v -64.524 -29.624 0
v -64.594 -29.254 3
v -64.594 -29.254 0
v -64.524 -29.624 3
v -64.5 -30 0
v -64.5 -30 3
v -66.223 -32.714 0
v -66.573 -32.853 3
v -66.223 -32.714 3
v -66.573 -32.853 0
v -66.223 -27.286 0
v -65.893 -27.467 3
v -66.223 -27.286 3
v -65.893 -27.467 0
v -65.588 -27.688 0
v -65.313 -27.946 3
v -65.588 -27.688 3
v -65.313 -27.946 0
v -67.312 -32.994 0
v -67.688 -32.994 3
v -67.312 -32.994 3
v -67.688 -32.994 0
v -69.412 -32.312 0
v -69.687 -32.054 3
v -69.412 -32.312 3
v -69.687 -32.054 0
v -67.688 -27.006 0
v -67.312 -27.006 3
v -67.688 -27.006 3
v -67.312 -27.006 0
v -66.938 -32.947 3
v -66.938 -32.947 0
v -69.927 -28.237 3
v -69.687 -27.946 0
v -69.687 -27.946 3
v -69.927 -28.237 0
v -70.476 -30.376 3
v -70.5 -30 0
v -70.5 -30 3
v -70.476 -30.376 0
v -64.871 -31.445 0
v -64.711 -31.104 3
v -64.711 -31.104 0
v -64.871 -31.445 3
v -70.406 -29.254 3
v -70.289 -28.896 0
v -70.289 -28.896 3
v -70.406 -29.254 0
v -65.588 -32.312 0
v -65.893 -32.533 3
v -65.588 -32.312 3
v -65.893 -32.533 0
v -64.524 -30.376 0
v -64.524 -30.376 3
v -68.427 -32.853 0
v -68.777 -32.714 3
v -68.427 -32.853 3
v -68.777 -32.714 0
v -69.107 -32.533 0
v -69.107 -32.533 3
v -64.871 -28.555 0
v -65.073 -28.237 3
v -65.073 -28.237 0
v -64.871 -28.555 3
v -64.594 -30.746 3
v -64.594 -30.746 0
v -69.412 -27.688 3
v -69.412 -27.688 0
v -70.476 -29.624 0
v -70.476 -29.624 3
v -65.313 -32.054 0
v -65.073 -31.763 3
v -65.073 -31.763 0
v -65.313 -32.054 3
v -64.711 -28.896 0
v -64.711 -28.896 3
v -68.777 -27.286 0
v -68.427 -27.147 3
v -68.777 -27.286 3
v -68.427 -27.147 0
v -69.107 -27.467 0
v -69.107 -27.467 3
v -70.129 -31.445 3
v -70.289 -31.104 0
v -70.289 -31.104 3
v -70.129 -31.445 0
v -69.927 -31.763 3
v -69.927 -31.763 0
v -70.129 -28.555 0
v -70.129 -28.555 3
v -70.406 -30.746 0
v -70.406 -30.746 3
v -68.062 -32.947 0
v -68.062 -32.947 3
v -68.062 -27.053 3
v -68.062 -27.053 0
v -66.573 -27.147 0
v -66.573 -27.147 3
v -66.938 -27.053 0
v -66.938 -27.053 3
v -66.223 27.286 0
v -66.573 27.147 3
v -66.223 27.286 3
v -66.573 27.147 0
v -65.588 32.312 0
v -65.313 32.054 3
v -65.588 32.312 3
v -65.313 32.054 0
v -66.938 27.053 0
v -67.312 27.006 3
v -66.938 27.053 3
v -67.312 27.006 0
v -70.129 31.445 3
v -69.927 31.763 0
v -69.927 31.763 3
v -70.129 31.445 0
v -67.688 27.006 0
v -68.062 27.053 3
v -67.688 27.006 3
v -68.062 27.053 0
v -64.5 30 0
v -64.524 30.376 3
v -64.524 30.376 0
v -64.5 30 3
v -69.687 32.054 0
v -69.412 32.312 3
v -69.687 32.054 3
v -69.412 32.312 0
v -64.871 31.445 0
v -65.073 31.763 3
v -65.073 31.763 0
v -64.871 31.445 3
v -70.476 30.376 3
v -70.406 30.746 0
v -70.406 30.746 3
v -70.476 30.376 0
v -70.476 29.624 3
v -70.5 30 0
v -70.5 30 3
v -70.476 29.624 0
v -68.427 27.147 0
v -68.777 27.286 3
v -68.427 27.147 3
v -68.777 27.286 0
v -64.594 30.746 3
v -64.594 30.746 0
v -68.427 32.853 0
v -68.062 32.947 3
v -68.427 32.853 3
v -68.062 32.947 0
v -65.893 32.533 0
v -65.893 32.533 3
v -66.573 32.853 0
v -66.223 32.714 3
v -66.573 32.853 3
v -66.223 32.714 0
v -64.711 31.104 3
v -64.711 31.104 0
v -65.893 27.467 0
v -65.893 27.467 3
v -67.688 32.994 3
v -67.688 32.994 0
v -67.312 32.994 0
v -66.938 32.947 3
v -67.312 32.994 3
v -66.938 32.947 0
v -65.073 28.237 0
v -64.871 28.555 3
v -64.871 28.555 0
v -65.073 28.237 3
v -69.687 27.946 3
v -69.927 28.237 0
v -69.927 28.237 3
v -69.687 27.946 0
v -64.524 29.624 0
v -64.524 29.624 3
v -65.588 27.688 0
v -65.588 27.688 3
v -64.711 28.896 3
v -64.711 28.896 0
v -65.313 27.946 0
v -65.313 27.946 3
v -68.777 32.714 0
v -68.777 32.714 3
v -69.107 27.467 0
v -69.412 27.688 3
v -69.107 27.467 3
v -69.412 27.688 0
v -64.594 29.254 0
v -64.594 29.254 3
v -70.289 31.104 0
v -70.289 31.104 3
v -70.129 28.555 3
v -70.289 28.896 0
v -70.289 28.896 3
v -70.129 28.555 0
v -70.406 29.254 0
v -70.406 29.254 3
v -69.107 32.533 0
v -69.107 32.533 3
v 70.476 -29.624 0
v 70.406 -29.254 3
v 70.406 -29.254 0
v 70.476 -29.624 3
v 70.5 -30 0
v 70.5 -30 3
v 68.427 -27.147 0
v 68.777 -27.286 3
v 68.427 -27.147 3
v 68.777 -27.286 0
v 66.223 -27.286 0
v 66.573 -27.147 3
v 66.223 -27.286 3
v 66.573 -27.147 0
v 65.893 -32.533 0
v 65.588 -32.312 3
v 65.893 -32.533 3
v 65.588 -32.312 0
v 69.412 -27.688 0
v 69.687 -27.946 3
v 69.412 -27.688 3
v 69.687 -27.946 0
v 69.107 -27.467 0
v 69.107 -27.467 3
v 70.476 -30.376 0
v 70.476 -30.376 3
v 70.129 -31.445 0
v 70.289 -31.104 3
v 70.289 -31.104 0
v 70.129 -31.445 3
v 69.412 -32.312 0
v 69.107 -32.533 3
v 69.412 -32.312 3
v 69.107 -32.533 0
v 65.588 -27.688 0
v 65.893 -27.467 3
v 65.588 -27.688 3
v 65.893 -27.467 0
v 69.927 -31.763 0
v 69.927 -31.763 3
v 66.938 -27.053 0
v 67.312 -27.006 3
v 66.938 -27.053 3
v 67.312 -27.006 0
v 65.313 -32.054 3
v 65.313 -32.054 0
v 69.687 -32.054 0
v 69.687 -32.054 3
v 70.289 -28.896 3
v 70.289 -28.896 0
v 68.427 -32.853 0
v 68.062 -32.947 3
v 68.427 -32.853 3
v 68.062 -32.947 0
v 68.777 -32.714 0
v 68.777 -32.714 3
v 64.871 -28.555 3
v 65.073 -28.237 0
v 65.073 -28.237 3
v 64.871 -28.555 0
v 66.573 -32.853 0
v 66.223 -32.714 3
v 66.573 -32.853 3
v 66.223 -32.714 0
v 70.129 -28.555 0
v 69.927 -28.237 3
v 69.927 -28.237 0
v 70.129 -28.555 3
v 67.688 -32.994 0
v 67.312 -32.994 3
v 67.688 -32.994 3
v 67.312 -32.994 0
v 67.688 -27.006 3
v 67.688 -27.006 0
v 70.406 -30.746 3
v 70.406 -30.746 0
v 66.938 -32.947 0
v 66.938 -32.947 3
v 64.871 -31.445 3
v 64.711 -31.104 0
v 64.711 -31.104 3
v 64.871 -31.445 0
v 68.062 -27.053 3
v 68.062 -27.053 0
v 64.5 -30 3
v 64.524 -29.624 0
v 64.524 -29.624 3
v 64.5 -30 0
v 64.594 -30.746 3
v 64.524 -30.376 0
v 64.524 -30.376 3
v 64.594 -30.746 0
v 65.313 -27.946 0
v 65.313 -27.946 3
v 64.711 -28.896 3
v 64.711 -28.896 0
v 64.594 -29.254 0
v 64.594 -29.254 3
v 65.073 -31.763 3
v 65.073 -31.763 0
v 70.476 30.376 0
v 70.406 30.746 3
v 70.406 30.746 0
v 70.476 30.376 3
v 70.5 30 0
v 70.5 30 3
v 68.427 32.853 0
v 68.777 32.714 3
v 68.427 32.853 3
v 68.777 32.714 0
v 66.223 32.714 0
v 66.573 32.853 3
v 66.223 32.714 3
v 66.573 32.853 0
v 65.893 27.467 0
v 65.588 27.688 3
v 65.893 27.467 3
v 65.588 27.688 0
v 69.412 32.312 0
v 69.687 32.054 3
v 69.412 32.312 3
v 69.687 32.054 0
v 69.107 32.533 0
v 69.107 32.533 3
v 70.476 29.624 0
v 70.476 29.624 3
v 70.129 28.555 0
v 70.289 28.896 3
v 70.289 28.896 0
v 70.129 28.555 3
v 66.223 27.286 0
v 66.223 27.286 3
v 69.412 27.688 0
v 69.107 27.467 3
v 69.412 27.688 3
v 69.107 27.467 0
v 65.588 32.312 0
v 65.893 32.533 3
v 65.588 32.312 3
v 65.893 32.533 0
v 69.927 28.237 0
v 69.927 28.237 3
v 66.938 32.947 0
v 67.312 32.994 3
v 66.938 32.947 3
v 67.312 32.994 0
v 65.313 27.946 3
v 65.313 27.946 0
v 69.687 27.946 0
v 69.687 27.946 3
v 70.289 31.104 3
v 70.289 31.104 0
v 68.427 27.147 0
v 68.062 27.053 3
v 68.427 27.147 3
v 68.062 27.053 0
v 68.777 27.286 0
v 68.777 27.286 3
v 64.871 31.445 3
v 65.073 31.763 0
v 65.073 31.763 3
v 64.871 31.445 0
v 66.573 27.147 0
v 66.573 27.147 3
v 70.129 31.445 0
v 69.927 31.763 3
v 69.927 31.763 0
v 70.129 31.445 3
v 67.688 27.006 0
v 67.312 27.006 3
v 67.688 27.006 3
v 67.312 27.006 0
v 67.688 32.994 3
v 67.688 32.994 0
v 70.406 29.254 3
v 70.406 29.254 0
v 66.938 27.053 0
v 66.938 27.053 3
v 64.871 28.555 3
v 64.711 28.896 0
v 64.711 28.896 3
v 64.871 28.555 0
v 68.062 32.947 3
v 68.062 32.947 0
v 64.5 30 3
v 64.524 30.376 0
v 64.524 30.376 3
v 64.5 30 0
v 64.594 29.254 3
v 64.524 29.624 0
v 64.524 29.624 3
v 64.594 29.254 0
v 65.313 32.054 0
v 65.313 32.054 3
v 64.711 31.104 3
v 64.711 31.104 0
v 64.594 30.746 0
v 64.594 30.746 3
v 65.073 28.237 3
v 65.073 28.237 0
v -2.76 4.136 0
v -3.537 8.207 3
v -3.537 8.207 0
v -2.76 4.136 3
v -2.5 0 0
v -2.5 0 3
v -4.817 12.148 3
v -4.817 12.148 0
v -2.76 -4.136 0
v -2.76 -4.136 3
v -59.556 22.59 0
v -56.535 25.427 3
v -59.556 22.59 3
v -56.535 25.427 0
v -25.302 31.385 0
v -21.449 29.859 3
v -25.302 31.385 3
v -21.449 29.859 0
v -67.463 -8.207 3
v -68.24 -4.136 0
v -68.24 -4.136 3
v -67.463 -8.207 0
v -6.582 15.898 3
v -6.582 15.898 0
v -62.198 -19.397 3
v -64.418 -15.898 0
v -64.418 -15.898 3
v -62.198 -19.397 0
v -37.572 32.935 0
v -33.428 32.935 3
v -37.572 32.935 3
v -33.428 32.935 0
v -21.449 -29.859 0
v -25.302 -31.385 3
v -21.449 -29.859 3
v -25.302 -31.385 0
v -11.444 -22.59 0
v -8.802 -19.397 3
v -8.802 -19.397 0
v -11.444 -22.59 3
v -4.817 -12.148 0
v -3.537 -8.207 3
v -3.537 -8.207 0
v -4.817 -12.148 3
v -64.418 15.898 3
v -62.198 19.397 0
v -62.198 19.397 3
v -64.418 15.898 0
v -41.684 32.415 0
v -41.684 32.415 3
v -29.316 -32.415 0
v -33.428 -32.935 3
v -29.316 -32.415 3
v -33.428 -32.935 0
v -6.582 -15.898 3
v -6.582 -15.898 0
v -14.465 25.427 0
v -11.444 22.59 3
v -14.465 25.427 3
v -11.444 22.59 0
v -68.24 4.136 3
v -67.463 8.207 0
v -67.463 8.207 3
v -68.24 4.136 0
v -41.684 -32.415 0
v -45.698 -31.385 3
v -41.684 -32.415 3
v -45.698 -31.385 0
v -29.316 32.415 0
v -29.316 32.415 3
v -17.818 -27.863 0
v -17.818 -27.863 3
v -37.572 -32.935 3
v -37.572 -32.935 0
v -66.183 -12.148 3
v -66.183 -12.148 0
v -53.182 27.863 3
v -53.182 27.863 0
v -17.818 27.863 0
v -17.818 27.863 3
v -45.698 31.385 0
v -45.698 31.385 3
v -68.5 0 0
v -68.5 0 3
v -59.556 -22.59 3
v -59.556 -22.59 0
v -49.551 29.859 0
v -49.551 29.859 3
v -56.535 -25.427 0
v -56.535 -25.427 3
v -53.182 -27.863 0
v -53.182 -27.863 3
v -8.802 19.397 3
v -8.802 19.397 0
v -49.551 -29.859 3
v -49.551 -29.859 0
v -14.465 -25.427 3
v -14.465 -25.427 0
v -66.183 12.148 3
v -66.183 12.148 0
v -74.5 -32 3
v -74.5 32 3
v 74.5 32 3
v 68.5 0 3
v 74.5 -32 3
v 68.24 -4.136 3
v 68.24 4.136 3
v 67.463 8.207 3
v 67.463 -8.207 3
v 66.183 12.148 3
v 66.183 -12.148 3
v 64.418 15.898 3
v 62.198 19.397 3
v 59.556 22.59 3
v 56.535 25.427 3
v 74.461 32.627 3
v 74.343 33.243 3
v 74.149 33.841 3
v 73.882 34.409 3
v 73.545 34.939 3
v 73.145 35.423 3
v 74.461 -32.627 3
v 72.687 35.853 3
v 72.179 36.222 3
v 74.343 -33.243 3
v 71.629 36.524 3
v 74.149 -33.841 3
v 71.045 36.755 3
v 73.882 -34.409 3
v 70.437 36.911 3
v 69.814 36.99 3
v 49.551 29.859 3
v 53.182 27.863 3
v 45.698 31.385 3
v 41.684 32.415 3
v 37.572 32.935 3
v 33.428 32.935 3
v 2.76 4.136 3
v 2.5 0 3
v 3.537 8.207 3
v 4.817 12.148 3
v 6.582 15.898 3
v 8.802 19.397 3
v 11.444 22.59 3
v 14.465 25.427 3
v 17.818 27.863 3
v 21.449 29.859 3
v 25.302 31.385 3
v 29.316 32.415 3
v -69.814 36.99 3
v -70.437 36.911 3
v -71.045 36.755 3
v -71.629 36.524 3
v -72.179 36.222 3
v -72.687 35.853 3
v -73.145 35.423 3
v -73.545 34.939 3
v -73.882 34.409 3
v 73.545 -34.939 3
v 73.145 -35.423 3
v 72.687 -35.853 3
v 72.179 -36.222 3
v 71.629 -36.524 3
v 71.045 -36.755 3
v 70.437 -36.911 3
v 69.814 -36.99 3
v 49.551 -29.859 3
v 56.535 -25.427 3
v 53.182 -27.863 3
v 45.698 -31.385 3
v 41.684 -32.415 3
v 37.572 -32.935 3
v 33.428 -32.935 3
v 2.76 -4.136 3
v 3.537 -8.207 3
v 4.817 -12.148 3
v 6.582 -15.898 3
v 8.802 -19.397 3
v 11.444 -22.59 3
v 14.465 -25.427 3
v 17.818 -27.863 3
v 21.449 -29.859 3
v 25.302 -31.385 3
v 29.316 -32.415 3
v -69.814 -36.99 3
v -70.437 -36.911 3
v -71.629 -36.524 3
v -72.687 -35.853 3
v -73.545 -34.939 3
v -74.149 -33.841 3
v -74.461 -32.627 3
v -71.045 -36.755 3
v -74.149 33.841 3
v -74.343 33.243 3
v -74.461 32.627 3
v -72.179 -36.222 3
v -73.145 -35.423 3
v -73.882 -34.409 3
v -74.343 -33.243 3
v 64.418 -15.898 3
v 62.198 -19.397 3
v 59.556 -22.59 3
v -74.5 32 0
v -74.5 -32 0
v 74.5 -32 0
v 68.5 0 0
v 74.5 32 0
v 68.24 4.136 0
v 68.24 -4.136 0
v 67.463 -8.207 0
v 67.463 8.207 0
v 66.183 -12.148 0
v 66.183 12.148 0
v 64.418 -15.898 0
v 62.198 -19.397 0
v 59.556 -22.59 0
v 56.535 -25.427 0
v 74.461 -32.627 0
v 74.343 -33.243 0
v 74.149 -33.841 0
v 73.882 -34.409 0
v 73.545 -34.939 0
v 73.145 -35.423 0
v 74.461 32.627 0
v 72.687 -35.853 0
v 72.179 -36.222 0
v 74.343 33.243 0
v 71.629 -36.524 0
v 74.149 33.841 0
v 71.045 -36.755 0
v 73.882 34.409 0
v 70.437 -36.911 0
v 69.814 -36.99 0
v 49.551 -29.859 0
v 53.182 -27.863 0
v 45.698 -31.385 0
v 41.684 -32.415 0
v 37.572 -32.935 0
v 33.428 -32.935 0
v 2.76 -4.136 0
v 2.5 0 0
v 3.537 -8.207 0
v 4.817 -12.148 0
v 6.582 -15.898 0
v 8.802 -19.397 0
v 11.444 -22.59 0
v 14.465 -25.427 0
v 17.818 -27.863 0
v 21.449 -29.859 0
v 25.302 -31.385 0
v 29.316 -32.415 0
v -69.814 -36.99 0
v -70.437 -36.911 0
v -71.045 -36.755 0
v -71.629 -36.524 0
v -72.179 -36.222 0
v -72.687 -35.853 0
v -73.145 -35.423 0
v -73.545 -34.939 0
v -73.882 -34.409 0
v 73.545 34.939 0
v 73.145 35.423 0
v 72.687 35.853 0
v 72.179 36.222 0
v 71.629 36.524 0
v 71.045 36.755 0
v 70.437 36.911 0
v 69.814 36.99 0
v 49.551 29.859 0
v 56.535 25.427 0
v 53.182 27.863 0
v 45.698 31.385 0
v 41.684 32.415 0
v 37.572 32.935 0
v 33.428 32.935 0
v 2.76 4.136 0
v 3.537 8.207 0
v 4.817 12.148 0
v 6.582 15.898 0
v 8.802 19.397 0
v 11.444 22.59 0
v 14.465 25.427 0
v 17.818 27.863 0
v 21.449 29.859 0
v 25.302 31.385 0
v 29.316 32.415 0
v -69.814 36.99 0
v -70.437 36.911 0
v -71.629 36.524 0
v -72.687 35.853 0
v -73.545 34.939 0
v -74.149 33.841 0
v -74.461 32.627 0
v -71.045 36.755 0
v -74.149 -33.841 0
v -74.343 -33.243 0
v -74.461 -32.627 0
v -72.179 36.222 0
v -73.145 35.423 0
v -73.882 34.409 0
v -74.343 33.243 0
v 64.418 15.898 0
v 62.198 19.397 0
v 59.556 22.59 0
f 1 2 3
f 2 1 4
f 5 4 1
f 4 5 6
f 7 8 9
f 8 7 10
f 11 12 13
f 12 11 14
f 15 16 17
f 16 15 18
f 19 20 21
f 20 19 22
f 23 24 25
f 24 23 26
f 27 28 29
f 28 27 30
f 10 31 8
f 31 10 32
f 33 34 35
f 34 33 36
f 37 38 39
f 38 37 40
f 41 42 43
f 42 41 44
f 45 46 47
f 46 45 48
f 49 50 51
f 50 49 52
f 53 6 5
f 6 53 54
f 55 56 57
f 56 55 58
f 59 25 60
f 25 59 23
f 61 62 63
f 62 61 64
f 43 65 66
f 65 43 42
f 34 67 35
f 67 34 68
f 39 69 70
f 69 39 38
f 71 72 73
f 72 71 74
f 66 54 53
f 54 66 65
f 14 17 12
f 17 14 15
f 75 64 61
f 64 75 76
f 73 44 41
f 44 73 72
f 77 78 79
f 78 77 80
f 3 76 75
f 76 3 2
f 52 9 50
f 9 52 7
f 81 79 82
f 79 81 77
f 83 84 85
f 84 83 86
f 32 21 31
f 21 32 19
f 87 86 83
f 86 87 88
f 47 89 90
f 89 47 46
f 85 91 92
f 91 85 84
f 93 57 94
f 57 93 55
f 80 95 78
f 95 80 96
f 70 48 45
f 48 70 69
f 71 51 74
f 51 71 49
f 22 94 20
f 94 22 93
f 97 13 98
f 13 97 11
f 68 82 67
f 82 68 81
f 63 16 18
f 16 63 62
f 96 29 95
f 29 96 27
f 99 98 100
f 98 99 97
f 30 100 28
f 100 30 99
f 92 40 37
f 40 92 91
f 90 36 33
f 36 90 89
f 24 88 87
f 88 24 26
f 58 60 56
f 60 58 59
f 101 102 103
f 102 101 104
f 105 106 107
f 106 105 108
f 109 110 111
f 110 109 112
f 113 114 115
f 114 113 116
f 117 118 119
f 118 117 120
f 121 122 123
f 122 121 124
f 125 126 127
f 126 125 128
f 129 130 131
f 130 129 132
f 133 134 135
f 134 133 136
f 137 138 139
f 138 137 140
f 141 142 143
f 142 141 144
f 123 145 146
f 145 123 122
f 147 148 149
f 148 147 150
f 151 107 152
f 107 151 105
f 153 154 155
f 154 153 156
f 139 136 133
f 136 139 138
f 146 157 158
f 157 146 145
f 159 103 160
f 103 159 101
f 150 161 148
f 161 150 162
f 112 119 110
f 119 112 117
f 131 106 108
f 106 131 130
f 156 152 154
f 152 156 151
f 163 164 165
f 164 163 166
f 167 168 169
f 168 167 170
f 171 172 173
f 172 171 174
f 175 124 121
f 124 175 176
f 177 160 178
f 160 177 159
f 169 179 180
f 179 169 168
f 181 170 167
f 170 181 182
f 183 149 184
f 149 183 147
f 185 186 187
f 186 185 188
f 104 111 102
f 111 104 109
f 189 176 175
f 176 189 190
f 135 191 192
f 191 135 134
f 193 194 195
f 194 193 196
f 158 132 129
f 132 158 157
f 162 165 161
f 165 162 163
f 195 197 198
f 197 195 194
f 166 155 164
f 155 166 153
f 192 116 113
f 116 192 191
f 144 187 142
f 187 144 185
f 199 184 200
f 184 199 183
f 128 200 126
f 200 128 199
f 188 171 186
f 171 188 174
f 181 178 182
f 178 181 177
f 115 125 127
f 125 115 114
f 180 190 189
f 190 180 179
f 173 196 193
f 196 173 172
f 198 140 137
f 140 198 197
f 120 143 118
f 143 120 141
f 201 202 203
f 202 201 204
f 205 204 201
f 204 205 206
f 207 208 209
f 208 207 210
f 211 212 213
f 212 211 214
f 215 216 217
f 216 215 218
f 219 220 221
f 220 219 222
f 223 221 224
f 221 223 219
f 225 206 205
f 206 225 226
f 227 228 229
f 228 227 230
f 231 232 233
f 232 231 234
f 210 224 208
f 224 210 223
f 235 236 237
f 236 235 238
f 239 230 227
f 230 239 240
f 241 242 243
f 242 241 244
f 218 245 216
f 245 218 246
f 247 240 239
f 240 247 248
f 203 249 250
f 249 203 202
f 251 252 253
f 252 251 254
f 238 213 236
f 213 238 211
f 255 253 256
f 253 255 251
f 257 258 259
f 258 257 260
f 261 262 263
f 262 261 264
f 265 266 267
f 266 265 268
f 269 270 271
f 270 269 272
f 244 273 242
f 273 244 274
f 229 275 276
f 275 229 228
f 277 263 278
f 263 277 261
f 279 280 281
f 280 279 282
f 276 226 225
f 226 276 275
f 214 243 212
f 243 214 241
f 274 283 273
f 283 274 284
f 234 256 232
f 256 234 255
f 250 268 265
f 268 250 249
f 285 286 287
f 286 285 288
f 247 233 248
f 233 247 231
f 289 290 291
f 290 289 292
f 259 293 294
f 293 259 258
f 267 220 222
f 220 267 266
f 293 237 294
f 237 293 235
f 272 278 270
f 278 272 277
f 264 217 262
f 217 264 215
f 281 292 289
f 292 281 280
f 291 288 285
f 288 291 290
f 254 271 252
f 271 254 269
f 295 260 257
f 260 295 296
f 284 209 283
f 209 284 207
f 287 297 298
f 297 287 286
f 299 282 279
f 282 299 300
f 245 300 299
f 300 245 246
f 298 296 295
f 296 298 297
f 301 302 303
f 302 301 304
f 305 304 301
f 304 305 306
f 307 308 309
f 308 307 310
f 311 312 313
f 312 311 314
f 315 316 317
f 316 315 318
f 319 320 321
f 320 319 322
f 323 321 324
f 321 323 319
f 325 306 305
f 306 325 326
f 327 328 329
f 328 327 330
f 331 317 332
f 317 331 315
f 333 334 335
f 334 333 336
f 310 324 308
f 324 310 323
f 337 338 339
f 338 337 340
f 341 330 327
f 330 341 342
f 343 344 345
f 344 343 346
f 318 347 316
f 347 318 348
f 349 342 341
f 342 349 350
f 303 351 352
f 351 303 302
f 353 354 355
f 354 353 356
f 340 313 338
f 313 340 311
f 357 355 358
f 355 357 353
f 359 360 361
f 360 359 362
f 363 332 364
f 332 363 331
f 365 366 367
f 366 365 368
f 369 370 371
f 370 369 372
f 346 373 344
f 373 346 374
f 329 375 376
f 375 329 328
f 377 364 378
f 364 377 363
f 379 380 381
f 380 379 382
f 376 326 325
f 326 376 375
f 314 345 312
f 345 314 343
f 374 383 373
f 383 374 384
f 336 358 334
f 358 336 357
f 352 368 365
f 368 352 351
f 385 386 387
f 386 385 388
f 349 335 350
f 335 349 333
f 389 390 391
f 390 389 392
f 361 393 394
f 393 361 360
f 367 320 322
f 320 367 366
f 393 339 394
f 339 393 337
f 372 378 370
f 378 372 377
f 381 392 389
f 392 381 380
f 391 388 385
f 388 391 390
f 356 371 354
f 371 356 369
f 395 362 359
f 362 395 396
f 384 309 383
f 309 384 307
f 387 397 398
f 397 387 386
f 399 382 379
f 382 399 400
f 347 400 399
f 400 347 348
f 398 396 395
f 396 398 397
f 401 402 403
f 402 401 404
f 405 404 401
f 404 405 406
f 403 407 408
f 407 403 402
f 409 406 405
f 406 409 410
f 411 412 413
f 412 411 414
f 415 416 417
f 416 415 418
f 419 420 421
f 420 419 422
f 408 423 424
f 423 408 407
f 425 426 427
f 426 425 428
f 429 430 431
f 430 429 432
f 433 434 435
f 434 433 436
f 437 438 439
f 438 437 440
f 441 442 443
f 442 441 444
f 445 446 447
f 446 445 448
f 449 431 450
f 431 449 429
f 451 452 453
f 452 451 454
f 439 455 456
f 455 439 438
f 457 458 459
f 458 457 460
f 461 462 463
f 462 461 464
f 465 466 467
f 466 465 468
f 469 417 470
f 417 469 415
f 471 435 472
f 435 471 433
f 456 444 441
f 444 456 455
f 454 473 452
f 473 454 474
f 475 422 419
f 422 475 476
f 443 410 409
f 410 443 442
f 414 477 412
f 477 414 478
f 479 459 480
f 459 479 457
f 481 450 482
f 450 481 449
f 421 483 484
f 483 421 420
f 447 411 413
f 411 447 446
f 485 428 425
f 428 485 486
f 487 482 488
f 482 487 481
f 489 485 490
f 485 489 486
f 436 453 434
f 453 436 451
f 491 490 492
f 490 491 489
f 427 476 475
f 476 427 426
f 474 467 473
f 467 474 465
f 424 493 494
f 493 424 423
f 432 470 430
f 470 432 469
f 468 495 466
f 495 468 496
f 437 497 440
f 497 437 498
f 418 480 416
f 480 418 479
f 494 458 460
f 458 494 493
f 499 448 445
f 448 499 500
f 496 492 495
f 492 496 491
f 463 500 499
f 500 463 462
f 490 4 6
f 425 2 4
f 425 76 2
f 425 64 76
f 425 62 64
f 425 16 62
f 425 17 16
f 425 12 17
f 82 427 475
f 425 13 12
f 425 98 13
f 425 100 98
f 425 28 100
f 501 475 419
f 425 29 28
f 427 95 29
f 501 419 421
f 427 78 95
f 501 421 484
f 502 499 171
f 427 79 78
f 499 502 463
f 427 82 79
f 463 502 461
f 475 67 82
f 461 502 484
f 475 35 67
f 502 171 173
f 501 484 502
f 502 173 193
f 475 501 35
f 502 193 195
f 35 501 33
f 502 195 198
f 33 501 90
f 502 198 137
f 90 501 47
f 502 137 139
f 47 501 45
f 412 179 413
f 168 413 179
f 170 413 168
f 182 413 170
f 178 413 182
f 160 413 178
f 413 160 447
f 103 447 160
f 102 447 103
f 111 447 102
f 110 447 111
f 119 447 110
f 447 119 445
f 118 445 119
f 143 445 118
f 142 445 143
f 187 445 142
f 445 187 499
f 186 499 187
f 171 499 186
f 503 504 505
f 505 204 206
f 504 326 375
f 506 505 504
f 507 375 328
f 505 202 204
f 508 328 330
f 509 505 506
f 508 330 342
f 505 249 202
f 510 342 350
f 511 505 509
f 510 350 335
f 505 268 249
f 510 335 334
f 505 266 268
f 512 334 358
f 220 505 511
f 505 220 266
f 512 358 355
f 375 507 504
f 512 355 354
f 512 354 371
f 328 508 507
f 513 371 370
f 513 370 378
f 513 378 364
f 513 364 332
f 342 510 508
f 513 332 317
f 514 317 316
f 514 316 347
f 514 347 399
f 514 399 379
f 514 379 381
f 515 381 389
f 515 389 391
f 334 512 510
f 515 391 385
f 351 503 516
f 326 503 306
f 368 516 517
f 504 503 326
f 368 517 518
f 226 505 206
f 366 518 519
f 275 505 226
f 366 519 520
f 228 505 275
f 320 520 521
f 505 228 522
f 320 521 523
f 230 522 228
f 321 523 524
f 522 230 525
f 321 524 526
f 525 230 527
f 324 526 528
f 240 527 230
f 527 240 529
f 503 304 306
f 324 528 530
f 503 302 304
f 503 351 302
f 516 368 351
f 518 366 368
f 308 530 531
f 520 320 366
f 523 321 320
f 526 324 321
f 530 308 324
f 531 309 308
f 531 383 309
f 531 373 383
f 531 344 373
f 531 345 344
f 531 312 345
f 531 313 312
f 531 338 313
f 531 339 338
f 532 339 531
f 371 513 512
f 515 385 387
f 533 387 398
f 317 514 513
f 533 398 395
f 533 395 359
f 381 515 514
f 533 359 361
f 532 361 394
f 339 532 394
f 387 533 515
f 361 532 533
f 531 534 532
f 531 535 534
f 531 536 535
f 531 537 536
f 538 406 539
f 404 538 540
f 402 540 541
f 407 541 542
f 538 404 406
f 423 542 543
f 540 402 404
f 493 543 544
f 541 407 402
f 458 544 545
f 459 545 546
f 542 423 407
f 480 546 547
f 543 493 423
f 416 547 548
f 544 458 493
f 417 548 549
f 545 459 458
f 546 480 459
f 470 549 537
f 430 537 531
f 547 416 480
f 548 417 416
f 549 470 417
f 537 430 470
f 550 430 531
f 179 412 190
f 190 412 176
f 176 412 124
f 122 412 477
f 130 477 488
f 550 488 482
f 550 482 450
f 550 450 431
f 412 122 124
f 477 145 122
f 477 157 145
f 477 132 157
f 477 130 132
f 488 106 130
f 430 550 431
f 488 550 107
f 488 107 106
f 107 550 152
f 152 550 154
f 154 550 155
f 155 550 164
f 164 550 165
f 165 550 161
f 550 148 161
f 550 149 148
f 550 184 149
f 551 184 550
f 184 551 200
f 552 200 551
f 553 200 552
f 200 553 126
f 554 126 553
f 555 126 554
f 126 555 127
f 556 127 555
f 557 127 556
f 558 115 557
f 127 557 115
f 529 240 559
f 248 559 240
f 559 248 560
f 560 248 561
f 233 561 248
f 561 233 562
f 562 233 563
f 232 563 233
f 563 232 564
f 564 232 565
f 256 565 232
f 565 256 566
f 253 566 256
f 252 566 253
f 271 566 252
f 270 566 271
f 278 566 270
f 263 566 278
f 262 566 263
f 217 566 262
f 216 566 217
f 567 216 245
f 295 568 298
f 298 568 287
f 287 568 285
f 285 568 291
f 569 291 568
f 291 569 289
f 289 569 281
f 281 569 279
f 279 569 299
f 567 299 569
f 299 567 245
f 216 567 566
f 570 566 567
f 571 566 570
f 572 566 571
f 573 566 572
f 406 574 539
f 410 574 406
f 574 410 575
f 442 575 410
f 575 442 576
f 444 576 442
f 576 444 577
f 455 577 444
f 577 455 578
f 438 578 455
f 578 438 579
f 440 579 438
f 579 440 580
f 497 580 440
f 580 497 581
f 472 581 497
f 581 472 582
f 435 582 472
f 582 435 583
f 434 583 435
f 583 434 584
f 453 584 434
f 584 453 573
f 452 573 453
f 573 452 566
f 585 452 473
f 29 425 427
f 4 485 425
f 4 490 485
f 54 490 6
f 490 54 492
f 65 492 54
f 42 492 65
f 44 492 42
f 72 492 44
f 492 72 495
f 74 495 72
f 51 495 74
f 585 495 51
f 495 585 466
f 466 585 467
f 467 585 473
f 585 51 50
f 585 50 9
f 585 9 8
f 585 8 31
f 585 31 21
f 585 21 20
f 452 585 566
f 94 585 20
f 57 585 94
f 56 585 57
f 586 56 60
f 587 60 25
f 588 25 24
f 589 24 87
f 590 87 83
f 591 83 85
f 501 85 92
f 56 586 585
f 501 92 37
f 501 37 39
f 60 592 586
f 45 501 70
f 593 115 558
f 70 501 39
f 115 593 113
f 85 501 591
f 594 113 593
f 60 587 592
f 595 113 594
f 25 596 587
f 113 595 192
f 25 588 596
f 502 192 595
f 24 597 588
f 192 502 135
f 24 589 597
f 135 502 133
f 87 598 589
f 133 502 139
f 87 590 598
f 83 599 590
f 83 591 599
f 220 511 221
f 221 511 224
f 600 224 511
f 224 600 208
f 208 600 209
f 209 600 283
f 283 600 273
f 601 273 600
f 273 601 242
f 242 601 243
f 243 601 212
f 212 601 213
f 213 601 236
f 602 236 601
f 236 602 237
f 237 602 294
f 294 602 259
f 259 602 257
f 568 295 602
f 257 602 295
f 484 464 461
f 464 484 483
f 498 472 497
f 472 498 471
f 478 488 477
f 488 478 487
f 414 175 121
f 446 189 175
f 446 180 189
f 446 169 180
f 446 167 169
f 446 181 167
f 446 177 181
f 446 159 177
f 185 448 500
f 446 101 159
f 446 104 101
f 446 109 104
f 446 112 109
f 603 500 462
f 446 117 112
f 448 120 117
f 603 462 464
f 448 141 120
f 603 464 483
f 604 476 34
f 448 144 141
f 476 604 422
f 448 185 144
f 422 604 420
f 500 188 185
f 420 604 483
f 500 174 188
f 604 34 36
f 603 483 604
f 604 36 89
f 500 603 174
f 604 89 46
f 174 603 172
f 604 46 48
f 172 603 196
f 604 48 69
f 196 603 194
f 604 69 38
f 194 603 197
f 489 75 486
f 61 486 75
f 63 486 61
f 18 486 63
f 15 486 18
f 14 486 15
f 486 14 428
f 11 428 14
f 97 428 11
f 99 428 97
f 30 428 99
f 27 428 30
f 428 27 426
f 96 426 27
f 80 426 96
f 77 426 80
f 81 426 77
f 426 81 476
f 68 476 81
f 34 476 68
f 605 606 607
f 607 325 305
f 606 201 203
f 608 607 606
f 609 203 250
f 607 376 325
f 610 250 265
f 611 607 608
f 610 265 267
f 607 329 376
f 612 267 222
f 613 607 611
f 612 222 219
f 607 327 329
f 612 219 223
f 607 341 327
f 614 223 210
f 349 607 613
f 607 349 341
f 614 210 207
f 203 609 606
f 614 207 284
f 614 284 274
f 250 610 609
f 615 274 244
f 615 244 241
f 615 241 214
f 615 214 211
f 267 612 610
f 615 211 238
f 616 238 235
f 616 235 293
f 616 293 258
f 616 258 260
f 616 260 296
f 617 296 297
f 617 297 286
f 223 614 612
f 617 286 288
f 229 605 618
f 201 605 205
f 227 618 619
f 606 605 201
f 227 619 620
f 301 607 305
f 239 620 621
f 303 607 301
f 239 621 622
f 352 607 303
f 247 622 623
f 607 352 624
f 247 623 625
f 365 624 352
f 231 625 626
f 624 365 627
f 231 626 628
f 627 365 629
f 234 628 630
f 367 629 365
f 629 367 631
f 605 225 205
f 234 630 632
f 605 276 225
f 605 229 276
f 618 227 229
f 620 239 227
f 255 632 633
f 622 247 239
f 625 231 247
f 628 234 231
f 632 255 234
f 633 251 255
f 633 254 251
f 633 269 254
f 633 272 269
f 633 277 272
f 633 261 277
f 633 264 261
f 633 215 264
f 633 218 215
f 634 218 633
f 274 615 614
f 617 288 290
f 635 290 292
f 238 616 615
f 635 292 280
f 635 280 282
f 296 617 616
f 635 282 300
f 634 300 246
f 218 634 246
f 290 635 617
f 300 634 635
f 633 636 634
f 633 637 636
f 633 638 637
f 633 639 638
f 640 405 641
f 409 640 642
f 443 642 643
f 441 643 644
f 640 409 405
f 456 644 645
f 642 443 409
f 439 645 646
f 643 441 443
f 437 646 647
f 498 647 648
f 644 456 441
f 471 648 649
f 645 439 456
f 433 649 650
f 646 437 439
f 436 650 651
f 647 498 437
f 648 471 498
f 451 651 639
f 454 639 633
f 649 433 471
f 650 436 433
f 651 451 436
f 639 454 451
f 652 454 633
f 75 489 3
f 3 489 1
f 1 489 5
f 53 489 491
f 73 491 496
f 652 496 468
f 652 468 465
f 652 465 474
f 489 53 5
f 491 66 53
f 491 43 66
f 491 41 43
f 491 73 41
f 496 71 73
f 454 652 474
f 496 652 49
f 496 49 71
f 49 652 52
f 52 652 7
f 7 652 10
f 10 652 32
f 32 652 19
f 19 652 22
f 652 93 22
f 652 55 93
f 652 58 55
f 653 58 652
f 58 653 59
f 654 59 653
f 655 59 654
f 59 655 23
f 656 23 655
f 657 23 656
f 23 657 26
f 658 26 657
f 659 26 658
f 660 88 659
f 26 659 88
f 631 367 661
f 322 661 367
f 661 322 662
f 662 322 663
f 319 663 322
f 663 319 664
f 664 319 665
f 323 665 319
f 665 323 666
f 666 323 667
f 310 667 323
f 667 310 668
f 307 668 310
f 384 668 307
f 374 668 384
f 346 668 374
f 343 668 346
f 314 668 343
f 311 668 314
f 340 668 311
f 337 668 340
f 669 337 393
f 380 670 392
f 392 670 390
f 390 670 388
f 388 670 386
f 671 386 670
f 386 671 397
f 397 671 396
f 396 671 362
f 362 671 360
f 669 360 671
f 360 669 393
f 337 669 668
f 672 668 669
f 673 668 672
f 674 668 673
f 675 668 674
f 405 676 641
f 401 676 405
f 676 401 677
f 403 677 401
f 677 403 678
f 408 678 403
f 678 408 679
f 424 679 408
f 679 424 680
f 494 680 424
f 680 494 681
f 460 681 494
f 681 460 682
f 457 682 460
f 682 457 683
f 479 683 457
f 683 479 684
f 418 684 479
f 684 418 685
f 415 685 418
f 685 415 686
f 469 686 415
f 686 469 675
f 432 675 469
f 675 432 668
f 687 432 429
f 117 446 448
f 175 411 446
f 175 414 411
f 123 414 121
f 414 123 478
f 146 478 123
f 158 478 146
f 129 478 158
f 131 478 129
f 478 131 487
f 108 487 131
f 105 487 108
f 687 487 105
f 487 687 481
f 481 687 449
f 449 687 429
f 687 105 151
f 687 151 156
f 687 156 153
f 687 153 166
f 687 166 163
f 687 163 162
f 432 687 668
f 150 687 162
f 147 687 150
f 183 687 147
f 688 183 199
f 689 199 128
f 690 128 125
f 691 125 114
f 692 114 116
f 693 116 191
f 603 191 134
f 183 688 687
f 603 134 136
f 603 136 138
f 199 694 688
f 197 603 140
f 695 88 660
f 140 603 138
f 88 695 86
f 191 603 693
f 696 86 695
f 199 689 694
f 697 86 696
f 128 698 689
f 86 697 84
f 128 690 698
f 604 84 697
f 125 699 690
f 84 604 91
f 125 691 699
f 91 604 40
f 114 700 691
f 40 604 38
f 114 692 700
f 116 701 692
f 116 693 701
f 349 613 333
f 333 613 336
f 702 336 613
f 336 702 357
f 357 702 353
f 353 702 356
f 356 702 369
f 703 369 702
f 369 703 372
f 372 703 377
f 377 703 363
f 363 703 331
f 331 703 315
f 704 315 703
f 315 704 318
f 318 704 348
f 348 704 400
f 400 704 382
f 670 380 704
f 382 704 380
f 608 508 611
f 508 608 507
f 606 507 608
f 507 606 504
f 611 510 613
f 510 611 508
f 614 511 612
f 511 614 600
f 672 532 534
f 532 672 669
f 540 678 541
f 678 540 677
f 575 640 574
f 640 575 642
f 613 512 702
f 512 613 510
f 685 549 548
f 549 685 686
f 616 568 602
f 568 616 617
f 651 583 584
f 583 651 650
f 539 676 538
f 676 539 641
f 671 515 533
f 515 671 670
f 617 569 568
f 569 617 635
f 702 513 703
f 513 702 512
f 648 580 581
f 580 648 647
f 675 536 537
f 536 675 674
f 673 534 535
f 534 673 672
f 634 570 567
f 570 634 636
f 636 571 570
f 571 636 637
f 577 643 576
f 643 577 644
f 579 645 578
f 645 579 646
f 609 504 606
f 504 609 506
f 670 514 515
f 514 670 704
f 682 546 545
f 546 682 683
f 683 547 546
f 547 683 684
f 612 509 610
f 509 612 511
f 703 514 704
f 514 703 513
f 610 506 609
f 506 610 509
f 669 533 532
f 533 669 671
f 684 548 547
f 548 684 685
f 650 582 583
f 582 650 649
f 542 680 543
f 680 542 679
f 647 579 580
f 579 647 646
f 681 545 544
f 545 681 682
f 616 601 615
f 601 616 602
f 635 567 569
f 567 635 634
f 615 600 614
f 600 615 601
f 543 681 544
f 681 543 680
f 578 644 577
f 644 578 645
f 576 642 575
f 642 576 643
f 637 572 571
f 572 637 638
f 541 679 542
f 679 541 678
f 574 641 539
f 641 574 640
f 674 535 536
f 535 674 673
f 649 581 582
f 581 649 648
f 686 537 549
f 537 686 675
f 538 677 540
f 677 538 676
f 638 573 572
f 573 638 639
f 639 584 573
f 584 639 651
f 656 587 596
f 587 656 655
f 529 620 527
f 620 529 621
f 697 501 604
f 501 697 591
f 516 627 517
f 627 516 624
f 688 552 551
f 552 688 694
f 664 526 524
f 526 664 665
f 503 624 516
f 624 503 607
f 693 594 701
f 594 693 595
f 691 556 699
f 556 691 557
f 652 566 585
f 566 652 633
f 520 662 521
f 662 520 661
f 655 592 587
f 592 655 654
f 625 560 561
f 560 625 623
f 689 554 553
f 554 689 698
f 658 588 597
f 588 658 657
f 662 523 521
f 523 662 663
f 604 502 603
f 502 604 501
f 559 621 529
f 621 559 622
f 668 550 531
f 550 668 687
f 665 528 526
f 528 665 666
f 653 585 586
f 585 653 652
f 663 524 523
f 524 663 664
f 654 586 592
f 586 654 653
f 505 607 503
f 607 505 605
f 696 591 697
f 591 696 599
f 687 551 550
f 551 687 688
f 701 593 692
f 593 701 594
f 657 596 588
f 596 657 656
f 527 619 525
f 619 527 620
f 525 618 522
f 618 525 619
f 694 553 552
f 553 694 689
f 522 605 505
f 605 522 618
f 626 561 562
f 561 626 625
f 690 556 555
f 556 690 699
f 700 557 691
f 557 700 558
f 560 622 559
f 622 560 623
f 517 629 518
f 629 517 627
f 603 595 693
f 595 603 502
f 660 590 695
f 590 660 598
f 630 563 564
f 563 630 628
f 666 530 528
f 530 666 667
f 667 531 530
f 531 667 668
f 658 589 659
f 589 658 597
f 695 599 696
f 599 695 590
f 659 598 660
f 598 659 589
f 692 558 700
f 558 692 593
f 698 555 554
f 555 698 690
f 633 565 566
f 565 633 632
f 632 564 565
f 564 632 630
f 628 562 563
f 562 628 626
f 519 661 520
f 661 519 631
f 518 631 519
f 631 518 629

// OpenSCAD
$fn = 50;


difference() {
	union() {
		hull() {
			translate(v = [-69.5000000000, 32.0000000000, 0]) {
				cylinder(h = 3, r = 5);
			}
			translate(v = [69.5000000000, 32.0000000000, 0]) {
				cylinder(h = 3, r = 5);
			}
			translate(v = [-69.5000000000, -32.0000000000, 0]) {
				cylinder(h = 3, r = 5);
			}
			translate(v = [69.5000000000, -32.0000000000, 0]) {
				cylinder(h = 3, r = 5);
			}
		}
	}
	union() {
		#translate(v = [-67.5000000000, -30.0000000000, -100.0000000000]) {
			cylinder(h = 200, r = 3.0000000000);
		}
		#translate(v = [-67.5000000000, 30.0000000000, -100.0000000000]) {
			cylinder(h = 200, r = 3.0000000000);
		}
		#translate(v = [67.5000000000, -30.0000000000, -100.0000000000]) {
			cylinder(h = 200, r = 3.0000000000);
		}
		#translate(v = [67.5000000000, 30.0000000000, -100.0000000000]) {
			cylinder(h = 200, r = 3.0000000000);
		}
		#translate(v = [-35.5000000000, 0, 0]) {
			cylinder(h = 3, r = 33.0000000000);
		}
		#translate(v = [35.5000000000, 0, 0]) {
			cylinder(h = 3, r = 33.0000000000);
		}
	}
}
